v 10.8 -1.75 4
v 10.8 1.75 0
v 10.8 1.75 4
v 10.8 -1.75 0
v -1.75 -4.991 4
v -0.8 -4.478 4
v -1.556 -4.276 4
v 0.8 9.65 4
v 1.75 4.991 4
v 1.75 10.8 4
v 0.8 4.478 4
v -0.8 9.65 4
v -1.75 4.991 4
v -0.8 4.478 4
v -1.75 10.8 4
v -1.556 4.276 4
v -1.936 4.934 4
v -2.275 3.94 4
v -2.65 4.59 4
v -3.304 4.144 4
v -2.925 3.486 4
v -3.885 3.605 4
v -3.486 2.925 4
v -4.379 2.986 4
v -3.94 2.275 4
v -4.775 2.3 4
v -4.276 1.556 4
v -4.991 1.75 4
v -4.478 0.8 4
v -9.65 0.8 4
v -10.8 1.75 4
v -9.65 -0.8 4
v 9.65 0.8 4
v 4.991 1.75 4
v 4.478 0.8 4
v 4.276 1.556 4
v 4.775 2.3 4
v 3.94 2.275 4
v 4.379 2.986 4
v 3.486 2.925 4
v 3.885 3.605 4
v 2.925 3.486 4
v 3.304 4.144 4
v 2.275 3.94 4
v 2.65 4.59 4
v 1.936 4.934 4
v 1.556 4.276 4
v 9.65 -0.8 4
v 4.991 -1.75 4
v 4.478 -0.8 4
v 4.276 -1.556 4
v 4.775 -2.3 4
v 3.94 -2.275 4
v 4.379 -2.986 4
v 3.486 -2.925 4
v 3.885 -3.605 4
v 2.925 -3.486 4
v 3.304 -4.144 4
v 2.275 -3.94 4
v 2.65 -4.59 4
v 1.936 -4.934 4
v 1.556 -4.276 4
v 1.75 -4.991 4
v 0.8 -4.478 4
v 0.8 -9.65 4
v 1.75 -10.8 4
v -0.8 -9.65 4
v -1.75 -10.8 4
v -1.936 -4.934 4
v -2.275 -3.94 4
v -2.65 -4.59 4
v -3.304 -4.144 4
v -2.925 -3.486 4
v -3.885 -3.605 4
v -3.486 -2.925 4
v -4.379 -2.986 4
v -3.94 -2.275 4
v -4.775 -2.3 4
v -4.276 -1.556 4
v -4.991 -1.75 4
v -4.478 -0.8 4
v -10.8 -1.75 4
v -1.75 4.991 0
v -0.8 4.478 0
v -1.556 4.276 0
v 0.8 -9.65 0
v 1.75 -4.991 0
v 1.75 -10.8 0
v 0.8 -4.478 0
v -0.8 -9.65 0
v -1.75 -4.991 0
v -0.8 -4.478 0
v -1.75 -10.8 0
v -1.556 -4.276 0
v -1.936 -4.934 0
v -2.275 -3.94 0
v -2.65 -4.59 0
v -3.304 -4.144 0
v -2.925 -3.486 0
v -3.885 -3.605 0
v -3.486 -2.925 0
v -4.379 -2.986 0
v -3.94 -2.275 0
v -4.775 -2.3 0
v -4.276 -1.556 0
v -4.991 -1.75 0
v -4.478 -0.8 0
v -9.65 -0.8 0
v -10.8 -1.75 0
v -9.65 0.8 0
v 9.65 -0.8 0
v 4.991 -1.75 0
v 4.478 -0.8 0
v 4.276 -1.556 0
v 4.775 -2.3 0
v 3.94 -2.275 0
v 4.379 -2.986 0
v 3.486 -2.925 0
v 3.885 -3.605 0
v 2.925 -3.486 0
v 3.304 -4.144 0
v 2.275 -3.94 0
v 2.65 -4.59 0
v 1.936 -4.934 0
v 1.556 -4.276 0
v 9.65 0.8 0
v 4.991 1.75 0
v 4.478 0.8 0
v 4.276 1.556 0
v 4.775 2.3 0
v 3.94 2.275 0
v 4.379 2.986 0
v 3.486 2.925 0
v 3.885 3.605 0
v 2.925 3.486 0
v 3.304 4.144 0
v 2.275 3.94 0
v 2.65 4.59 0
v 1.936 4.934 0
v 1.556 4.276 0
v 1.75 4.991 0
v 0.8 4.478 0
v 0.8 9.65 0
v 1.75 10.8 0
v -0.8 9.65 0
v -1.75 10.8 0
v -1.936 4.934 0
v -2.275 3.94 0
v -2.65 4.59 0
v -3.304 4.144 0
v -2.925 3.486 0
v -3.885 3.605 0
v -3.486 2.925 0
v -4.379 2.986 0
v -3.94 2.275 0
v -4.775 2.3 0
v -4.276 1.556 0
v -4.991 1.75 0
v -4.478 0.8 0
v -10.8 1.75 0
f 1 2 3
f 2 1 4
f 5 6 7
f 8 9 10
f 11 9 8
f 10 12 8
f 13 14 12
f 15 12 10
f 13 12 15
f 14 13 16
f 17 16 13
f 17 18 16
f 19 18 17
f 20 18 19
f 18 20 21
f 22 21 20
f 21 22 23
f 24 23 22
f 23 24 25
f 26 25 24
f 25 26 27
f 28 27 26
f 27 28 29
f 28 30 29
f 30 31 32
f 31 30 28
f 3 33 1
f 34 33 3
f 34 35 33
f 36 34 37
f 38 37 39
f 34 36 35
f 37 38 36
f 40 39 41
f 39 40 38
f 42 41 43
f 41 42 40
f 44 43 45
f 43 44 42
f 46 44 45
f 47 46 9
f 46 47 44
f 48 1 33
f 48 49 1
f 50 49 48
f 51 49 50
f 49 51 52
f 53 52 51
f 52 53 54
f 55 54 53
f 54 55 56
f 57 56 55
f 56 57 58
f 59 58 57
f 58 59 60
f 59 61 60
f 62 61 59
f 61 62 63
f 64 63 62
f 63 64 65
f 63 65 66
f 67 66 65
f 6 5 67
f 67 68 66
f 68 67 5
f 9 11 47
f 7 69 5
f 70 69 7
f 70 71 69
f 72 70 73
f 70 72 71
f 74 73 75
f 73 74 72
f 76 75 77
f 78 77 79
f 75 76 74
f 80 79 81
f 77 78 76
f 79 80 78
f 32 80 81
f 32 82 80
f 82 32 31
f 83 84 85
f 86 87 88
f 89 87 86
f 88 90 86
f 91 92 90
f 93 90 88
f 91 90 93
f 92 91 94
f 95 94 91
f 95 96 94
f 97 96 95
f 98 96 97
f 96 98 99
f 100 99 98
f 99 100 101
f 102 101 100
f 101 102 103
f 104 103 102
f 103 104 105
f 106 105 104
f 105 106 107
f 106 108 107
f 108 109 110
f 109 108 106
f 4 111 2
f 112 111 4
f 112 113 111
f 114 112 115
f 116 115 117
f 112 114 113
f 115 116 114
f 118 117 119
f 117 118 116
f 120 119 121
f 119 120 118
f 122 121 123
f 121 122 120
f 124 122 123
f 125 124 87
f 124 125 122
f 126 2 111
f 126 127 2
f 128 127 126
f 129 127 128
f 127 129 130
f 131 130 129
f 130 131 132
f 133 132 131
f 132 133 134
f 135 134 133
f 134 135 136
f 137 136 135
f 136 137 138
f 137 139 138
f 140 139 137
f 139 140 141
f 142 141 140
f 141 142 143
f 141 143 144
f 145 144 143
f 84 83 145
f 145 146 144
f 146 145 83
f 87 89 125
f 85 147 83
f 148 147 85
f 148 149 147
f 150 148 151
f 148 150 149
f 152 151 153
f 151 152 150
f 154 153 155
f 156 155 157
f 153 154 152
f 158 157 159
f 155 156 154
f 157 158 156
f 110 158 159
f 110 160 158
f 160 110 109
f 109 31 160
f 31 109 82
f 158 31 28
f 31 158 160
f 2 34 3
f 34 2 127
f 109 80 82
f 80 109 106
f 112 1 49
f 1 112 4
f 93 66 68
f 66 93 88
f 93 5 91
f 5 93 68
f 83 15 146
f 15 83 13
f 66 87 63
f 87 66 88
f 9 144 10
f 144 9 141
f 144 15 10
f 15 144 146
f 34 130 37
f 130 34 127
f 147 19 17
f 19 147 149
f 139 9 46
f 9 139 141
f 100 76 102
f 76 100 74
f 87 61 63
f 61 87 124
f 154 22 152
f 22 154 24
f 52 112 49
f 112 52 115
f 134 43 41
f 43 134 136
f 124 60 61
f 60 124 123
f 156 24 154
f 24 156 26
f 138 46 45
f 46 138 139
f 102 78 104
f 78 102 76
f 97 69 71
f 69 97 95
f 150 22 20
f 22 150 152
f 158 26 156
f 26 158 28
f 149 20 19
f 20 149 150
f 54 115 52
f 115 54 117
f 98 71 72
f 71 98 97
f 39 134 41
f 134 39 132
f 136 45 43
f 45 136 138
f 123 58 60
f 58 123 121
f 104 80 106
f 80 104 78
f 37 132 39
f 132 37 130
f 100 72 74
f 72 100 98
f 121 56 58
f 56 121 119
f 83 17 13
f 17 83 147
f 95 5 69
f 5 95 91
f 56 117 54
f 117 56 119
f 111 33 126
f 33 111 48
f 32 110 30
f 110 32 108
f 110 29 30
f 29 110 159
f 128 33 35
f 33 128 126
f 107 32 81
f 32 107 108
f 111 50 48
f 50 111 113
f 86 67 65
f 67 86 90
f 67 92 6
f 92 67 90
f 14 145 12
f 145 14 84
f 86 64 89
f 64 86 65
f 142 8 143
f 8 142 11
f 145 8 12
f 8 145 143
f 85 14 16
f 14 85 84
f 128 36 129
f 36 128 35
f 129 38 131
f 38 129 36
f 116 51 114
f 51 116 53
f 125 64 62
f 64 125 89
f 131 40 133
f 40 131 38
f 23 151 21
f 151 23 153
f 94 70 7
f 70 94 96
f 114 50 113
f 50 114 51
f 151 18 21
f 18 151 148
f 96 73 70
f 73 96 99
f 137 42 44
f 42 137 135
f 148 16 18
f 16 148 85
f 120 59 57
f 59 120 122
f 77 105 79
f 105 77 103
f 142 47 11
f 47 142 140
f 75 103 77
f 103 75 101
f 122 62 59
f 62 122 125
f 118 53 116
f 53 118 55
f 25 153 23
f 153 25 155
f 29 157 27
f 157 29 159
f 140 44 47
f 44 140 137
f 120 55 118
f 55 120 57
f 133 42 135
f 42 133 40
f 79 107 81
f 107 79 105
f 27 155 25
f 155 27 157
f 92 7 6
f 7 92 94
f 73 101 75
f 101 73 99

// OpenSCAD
h=4;
$fs=.8;
$fa=.3;

module star(r, h, wing_x, wing_y) {
cylinder(r=r, h=h);
translate([0,0,h/2]){
cube([wing_x*2+2*r, wing_y, h], center=true);
rotate([0,0,90])cube([wing_x*2+2*r, wing_y, h], center=true);
}
}

t=0.1;

difference(){
star(10.6/2,h,5.5, 3.5);
translate([0,0,-.05])star((9+t)/2, h+.1, 5+t, 1.5+t);
}
